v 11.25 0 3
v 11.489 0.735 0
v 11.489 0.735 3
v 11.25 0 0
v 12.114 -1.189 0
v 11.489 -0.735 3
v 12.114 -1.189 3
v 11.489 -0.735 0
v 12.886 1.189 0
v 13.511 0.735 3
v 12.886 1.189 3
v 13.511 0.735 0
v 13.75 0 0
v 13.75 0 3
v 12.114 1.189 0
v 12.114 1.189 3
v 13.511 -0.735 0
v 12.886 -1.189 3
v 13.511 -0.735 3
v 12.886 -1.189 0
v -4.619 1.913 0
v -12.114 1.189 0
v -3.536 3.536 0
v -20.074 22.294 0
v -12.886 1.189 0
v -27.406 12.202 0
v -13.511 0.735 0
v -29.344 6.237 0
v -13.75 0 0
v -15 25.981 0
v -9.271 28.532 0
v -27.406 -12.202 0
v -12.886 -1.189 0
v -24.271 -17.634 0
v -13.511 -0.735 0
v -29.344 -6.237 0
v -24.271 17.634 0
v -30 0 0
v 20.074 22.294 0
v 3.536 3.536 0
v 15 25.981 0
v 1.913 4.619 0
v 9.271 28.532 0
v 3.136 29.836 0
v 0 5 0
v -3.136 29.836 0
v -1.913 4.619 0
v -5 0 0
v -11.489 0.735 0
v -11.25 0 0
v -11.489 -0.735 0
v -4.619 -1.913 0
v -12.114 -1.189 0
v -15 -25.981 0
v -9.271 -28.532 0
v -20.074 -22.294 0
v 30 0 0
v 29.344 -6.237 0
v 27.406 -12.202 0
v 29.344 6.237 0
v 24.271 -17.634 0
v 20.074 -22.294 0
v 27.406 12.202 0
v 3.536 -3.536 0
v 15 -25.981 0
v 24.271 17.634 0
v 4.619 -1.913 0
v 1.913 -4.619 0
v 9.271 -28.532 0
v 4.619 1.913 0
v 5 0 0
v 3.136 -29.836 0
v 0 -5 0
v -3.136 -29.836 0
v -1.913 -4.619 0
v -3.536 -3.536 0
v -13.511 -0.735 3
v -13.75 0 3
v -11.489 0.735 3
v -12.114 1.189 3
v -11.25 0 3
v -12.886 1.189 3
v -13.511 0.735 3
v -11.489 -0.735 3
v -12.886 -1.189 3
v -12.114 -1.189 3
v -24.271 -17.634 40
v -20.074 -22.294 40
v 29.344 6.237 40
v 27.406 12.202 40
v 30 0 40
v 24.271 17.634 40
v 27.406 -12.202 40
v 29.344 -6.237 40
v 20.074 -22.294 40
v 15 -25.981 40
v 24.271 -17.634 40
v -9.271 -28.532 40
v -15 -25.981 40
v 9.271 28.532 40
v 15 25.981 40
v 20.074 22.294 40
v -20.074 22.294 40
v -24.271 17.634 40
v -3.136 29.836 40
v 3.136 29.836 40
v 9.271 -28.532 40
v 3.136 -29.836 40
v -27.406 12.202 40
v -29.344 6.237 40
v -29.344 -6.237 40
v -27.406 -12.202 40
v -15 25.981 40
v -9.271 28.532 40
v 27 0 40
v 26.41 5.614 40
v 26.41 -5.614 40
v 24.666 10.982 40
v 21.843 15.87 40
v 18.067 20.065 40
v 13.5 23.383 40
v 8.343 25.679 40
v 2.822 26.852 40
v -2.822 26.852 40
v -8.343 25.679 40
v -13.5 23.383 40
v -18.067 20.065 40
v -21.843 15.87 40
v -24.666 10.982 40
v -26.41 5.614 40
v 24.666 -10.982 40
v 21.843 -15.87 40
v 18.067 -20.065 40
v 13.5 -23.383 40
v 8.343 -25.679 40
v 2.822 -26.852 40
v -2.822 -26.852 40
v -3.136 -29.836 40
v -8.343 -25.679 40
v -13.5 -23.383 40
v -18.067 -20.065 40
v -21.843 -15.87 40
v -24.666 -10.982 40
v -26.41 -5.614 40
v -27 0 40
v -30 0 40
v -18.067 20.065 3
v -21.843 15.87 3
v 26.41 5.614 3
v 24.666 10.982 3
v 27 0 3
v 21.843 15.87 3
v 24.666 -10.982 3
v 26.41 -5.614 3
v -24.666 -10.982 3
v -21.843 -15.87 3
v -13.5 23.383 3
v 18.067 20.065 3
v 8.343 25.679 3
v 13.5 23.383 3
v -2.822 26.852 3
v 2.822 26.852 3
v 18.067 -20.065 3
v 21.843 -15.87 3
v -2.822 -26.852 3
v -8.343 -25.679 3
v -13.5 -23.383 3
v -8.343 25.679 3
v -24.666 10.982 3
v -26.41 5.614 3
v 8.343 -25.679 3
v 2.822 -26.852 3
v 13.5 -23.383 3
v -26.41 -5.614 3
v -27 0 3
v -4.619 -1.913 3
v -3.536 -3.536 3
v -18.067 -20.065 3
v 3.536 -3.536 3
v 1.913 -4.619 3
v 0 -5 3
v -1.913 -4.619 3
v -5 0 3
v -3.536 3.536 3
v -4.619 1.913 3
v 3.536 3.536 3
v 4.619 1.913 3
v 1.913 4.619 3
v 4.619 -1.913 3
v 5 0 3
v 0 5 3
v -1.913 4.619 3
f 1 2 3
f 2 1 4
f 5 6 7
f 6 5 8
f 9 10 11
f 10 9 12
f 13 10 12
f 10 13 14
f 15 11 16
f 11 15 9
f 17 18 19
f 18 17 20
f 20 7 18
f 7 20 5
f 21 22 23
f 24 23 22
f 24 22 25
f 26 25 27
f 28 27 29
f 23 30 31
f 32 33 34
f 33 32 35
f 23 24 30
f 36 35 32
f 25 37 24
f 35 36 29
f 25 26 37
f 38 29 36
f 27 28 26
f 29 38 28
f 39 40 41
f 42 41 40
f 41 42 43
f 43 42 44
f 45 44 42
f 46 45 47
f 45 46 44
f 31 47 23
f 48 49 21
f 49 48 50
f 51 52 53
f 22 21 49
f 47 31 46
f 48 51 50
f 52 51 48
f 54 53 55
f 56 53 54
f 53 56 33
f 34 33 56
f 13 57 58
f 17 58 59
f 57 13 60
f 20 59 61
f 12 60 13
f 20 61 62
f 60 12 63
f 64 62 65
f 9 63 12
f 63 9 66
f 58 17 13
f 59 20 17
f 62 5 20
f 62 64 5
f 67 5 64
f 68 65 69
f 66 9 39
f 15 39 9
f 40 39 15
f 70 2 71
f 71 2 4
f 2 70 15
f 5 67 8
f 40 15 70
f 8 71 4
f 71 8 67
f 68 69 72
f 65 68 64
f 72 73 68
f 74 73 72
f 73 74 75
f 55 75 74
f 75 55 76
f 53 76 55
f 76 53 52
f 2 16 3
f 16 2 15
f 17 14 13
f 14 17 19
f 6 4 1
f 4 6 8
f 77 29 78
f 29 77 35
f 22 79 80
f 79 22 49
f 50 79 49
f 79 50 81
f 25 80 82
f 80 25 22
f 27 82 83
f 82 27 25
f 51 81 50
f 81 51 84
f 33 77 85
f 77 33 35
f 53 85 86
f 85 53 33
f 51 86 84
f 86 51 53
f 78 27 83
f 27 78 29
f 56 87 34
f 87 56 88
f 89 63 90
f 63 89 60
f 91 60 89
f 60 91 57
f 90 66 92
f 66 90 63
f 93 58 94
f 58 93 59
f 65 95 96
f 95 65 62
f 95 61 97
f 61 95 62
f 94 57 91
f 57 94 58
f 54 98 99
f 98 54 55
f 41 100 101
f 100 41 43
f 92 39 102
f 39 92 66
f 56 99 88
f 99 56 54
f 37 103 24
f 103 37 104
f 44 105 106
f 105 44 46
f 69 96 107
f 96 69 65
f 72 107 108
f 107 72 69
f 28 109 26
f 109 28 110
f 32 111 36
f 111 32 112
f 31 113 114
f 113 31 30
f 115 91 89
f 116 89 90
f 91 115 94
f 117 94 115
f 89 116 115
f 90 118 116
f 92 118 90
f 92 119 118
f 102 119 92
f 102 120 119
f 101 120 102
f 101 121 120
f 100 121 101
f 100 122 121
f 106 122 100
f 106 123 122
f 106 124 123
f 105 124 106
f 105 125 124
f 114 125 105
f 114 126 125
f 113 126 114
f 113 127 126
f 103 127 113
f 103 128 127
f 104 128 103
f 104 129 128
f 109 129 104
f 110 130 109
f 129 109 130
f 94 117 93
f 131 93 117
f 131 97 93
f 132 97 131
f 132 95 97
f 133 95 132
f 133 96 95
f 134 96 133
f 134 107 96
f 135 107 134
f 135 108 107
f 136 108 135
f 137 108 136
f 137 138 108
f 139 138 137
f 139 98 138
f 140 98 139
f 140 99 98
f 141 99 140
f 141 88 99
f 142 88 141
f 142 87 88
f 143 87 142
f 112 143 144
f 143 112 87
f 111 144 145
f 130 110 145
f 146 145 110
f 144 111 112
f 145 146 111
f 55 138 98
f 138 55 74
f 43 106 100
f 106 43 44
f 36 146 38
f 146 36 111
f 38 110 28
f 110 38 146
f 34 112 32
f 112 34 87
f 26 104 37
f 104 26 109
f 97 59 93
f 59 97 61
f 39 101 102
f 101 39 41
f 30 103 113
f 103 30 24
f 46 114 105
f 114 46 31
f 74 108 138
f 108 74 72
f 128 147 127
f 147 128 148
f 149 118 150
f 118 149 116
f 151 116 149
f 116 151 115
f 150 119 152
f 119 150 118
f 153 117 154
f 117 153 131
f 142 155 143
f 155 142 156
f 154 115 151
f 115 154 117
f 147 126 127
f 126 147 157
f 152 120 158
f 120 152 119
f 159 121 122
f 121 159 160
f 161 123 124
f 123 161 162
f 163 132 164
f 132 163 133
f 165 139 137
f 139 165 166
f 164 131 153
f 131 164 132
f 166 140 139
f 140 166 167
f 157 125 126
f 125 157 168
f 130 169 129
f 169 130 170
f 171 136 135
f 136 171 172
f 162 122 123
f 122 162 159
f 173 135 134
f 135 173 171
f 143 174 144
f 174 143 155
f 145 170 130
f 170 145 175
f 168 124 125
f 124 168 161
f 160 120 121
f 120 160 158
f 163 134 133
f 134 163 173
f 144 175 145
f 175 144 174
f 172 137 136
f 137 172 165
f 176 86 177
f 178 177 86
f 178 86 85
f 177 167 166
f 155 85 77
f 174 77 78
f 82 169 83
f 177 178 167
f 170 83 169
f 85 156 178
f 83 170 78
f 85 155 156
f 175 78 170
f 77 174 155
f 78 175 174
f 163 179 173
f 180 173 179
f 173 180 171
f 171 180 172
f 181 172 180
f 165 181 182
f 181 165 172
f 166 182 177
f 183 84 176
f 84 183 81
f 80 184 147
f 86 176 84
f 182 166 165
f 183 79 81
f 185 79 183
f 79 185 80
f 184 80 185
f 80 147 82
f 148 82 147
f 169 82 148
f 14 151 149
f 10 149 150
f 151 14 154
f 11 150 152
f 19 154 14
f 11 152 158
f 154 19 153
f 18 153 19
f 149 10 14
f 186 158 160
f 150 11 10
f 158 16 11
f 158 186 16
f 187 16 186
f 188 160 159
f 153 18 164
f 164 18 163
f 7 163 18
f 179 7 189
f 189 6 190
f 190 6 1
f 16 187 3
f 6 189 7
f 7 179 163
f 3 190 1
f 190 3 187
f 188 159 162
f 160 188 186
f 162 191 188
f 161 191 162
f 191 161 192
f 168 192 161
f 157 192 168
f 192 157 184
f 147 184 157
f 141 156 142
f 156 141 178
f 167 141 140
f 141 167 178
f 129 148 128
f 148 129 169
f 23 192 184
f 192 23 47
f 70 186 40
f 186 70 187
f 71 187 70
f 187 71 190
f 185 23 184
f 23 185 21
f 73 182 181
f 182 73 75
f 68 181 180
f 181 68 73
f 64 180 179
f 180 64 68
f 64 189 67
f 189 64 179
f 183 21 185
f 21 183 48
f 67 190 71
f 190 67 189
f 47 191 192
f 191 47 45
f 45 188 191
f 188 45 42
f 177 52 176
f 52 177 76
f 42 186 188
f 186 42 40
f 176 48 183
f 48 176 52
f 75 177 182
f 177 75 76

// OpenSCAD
difference(){
	cylinder(r=30,h=40);
	translate([0,0,3]) cylinder(r=27,h=40);
	cylinder(r=5,h=60);
	for (x=[1,-1]) translate([25/2*x,0,0]) cylinder(r=2.5/2,h=60,$fn=10);
}
